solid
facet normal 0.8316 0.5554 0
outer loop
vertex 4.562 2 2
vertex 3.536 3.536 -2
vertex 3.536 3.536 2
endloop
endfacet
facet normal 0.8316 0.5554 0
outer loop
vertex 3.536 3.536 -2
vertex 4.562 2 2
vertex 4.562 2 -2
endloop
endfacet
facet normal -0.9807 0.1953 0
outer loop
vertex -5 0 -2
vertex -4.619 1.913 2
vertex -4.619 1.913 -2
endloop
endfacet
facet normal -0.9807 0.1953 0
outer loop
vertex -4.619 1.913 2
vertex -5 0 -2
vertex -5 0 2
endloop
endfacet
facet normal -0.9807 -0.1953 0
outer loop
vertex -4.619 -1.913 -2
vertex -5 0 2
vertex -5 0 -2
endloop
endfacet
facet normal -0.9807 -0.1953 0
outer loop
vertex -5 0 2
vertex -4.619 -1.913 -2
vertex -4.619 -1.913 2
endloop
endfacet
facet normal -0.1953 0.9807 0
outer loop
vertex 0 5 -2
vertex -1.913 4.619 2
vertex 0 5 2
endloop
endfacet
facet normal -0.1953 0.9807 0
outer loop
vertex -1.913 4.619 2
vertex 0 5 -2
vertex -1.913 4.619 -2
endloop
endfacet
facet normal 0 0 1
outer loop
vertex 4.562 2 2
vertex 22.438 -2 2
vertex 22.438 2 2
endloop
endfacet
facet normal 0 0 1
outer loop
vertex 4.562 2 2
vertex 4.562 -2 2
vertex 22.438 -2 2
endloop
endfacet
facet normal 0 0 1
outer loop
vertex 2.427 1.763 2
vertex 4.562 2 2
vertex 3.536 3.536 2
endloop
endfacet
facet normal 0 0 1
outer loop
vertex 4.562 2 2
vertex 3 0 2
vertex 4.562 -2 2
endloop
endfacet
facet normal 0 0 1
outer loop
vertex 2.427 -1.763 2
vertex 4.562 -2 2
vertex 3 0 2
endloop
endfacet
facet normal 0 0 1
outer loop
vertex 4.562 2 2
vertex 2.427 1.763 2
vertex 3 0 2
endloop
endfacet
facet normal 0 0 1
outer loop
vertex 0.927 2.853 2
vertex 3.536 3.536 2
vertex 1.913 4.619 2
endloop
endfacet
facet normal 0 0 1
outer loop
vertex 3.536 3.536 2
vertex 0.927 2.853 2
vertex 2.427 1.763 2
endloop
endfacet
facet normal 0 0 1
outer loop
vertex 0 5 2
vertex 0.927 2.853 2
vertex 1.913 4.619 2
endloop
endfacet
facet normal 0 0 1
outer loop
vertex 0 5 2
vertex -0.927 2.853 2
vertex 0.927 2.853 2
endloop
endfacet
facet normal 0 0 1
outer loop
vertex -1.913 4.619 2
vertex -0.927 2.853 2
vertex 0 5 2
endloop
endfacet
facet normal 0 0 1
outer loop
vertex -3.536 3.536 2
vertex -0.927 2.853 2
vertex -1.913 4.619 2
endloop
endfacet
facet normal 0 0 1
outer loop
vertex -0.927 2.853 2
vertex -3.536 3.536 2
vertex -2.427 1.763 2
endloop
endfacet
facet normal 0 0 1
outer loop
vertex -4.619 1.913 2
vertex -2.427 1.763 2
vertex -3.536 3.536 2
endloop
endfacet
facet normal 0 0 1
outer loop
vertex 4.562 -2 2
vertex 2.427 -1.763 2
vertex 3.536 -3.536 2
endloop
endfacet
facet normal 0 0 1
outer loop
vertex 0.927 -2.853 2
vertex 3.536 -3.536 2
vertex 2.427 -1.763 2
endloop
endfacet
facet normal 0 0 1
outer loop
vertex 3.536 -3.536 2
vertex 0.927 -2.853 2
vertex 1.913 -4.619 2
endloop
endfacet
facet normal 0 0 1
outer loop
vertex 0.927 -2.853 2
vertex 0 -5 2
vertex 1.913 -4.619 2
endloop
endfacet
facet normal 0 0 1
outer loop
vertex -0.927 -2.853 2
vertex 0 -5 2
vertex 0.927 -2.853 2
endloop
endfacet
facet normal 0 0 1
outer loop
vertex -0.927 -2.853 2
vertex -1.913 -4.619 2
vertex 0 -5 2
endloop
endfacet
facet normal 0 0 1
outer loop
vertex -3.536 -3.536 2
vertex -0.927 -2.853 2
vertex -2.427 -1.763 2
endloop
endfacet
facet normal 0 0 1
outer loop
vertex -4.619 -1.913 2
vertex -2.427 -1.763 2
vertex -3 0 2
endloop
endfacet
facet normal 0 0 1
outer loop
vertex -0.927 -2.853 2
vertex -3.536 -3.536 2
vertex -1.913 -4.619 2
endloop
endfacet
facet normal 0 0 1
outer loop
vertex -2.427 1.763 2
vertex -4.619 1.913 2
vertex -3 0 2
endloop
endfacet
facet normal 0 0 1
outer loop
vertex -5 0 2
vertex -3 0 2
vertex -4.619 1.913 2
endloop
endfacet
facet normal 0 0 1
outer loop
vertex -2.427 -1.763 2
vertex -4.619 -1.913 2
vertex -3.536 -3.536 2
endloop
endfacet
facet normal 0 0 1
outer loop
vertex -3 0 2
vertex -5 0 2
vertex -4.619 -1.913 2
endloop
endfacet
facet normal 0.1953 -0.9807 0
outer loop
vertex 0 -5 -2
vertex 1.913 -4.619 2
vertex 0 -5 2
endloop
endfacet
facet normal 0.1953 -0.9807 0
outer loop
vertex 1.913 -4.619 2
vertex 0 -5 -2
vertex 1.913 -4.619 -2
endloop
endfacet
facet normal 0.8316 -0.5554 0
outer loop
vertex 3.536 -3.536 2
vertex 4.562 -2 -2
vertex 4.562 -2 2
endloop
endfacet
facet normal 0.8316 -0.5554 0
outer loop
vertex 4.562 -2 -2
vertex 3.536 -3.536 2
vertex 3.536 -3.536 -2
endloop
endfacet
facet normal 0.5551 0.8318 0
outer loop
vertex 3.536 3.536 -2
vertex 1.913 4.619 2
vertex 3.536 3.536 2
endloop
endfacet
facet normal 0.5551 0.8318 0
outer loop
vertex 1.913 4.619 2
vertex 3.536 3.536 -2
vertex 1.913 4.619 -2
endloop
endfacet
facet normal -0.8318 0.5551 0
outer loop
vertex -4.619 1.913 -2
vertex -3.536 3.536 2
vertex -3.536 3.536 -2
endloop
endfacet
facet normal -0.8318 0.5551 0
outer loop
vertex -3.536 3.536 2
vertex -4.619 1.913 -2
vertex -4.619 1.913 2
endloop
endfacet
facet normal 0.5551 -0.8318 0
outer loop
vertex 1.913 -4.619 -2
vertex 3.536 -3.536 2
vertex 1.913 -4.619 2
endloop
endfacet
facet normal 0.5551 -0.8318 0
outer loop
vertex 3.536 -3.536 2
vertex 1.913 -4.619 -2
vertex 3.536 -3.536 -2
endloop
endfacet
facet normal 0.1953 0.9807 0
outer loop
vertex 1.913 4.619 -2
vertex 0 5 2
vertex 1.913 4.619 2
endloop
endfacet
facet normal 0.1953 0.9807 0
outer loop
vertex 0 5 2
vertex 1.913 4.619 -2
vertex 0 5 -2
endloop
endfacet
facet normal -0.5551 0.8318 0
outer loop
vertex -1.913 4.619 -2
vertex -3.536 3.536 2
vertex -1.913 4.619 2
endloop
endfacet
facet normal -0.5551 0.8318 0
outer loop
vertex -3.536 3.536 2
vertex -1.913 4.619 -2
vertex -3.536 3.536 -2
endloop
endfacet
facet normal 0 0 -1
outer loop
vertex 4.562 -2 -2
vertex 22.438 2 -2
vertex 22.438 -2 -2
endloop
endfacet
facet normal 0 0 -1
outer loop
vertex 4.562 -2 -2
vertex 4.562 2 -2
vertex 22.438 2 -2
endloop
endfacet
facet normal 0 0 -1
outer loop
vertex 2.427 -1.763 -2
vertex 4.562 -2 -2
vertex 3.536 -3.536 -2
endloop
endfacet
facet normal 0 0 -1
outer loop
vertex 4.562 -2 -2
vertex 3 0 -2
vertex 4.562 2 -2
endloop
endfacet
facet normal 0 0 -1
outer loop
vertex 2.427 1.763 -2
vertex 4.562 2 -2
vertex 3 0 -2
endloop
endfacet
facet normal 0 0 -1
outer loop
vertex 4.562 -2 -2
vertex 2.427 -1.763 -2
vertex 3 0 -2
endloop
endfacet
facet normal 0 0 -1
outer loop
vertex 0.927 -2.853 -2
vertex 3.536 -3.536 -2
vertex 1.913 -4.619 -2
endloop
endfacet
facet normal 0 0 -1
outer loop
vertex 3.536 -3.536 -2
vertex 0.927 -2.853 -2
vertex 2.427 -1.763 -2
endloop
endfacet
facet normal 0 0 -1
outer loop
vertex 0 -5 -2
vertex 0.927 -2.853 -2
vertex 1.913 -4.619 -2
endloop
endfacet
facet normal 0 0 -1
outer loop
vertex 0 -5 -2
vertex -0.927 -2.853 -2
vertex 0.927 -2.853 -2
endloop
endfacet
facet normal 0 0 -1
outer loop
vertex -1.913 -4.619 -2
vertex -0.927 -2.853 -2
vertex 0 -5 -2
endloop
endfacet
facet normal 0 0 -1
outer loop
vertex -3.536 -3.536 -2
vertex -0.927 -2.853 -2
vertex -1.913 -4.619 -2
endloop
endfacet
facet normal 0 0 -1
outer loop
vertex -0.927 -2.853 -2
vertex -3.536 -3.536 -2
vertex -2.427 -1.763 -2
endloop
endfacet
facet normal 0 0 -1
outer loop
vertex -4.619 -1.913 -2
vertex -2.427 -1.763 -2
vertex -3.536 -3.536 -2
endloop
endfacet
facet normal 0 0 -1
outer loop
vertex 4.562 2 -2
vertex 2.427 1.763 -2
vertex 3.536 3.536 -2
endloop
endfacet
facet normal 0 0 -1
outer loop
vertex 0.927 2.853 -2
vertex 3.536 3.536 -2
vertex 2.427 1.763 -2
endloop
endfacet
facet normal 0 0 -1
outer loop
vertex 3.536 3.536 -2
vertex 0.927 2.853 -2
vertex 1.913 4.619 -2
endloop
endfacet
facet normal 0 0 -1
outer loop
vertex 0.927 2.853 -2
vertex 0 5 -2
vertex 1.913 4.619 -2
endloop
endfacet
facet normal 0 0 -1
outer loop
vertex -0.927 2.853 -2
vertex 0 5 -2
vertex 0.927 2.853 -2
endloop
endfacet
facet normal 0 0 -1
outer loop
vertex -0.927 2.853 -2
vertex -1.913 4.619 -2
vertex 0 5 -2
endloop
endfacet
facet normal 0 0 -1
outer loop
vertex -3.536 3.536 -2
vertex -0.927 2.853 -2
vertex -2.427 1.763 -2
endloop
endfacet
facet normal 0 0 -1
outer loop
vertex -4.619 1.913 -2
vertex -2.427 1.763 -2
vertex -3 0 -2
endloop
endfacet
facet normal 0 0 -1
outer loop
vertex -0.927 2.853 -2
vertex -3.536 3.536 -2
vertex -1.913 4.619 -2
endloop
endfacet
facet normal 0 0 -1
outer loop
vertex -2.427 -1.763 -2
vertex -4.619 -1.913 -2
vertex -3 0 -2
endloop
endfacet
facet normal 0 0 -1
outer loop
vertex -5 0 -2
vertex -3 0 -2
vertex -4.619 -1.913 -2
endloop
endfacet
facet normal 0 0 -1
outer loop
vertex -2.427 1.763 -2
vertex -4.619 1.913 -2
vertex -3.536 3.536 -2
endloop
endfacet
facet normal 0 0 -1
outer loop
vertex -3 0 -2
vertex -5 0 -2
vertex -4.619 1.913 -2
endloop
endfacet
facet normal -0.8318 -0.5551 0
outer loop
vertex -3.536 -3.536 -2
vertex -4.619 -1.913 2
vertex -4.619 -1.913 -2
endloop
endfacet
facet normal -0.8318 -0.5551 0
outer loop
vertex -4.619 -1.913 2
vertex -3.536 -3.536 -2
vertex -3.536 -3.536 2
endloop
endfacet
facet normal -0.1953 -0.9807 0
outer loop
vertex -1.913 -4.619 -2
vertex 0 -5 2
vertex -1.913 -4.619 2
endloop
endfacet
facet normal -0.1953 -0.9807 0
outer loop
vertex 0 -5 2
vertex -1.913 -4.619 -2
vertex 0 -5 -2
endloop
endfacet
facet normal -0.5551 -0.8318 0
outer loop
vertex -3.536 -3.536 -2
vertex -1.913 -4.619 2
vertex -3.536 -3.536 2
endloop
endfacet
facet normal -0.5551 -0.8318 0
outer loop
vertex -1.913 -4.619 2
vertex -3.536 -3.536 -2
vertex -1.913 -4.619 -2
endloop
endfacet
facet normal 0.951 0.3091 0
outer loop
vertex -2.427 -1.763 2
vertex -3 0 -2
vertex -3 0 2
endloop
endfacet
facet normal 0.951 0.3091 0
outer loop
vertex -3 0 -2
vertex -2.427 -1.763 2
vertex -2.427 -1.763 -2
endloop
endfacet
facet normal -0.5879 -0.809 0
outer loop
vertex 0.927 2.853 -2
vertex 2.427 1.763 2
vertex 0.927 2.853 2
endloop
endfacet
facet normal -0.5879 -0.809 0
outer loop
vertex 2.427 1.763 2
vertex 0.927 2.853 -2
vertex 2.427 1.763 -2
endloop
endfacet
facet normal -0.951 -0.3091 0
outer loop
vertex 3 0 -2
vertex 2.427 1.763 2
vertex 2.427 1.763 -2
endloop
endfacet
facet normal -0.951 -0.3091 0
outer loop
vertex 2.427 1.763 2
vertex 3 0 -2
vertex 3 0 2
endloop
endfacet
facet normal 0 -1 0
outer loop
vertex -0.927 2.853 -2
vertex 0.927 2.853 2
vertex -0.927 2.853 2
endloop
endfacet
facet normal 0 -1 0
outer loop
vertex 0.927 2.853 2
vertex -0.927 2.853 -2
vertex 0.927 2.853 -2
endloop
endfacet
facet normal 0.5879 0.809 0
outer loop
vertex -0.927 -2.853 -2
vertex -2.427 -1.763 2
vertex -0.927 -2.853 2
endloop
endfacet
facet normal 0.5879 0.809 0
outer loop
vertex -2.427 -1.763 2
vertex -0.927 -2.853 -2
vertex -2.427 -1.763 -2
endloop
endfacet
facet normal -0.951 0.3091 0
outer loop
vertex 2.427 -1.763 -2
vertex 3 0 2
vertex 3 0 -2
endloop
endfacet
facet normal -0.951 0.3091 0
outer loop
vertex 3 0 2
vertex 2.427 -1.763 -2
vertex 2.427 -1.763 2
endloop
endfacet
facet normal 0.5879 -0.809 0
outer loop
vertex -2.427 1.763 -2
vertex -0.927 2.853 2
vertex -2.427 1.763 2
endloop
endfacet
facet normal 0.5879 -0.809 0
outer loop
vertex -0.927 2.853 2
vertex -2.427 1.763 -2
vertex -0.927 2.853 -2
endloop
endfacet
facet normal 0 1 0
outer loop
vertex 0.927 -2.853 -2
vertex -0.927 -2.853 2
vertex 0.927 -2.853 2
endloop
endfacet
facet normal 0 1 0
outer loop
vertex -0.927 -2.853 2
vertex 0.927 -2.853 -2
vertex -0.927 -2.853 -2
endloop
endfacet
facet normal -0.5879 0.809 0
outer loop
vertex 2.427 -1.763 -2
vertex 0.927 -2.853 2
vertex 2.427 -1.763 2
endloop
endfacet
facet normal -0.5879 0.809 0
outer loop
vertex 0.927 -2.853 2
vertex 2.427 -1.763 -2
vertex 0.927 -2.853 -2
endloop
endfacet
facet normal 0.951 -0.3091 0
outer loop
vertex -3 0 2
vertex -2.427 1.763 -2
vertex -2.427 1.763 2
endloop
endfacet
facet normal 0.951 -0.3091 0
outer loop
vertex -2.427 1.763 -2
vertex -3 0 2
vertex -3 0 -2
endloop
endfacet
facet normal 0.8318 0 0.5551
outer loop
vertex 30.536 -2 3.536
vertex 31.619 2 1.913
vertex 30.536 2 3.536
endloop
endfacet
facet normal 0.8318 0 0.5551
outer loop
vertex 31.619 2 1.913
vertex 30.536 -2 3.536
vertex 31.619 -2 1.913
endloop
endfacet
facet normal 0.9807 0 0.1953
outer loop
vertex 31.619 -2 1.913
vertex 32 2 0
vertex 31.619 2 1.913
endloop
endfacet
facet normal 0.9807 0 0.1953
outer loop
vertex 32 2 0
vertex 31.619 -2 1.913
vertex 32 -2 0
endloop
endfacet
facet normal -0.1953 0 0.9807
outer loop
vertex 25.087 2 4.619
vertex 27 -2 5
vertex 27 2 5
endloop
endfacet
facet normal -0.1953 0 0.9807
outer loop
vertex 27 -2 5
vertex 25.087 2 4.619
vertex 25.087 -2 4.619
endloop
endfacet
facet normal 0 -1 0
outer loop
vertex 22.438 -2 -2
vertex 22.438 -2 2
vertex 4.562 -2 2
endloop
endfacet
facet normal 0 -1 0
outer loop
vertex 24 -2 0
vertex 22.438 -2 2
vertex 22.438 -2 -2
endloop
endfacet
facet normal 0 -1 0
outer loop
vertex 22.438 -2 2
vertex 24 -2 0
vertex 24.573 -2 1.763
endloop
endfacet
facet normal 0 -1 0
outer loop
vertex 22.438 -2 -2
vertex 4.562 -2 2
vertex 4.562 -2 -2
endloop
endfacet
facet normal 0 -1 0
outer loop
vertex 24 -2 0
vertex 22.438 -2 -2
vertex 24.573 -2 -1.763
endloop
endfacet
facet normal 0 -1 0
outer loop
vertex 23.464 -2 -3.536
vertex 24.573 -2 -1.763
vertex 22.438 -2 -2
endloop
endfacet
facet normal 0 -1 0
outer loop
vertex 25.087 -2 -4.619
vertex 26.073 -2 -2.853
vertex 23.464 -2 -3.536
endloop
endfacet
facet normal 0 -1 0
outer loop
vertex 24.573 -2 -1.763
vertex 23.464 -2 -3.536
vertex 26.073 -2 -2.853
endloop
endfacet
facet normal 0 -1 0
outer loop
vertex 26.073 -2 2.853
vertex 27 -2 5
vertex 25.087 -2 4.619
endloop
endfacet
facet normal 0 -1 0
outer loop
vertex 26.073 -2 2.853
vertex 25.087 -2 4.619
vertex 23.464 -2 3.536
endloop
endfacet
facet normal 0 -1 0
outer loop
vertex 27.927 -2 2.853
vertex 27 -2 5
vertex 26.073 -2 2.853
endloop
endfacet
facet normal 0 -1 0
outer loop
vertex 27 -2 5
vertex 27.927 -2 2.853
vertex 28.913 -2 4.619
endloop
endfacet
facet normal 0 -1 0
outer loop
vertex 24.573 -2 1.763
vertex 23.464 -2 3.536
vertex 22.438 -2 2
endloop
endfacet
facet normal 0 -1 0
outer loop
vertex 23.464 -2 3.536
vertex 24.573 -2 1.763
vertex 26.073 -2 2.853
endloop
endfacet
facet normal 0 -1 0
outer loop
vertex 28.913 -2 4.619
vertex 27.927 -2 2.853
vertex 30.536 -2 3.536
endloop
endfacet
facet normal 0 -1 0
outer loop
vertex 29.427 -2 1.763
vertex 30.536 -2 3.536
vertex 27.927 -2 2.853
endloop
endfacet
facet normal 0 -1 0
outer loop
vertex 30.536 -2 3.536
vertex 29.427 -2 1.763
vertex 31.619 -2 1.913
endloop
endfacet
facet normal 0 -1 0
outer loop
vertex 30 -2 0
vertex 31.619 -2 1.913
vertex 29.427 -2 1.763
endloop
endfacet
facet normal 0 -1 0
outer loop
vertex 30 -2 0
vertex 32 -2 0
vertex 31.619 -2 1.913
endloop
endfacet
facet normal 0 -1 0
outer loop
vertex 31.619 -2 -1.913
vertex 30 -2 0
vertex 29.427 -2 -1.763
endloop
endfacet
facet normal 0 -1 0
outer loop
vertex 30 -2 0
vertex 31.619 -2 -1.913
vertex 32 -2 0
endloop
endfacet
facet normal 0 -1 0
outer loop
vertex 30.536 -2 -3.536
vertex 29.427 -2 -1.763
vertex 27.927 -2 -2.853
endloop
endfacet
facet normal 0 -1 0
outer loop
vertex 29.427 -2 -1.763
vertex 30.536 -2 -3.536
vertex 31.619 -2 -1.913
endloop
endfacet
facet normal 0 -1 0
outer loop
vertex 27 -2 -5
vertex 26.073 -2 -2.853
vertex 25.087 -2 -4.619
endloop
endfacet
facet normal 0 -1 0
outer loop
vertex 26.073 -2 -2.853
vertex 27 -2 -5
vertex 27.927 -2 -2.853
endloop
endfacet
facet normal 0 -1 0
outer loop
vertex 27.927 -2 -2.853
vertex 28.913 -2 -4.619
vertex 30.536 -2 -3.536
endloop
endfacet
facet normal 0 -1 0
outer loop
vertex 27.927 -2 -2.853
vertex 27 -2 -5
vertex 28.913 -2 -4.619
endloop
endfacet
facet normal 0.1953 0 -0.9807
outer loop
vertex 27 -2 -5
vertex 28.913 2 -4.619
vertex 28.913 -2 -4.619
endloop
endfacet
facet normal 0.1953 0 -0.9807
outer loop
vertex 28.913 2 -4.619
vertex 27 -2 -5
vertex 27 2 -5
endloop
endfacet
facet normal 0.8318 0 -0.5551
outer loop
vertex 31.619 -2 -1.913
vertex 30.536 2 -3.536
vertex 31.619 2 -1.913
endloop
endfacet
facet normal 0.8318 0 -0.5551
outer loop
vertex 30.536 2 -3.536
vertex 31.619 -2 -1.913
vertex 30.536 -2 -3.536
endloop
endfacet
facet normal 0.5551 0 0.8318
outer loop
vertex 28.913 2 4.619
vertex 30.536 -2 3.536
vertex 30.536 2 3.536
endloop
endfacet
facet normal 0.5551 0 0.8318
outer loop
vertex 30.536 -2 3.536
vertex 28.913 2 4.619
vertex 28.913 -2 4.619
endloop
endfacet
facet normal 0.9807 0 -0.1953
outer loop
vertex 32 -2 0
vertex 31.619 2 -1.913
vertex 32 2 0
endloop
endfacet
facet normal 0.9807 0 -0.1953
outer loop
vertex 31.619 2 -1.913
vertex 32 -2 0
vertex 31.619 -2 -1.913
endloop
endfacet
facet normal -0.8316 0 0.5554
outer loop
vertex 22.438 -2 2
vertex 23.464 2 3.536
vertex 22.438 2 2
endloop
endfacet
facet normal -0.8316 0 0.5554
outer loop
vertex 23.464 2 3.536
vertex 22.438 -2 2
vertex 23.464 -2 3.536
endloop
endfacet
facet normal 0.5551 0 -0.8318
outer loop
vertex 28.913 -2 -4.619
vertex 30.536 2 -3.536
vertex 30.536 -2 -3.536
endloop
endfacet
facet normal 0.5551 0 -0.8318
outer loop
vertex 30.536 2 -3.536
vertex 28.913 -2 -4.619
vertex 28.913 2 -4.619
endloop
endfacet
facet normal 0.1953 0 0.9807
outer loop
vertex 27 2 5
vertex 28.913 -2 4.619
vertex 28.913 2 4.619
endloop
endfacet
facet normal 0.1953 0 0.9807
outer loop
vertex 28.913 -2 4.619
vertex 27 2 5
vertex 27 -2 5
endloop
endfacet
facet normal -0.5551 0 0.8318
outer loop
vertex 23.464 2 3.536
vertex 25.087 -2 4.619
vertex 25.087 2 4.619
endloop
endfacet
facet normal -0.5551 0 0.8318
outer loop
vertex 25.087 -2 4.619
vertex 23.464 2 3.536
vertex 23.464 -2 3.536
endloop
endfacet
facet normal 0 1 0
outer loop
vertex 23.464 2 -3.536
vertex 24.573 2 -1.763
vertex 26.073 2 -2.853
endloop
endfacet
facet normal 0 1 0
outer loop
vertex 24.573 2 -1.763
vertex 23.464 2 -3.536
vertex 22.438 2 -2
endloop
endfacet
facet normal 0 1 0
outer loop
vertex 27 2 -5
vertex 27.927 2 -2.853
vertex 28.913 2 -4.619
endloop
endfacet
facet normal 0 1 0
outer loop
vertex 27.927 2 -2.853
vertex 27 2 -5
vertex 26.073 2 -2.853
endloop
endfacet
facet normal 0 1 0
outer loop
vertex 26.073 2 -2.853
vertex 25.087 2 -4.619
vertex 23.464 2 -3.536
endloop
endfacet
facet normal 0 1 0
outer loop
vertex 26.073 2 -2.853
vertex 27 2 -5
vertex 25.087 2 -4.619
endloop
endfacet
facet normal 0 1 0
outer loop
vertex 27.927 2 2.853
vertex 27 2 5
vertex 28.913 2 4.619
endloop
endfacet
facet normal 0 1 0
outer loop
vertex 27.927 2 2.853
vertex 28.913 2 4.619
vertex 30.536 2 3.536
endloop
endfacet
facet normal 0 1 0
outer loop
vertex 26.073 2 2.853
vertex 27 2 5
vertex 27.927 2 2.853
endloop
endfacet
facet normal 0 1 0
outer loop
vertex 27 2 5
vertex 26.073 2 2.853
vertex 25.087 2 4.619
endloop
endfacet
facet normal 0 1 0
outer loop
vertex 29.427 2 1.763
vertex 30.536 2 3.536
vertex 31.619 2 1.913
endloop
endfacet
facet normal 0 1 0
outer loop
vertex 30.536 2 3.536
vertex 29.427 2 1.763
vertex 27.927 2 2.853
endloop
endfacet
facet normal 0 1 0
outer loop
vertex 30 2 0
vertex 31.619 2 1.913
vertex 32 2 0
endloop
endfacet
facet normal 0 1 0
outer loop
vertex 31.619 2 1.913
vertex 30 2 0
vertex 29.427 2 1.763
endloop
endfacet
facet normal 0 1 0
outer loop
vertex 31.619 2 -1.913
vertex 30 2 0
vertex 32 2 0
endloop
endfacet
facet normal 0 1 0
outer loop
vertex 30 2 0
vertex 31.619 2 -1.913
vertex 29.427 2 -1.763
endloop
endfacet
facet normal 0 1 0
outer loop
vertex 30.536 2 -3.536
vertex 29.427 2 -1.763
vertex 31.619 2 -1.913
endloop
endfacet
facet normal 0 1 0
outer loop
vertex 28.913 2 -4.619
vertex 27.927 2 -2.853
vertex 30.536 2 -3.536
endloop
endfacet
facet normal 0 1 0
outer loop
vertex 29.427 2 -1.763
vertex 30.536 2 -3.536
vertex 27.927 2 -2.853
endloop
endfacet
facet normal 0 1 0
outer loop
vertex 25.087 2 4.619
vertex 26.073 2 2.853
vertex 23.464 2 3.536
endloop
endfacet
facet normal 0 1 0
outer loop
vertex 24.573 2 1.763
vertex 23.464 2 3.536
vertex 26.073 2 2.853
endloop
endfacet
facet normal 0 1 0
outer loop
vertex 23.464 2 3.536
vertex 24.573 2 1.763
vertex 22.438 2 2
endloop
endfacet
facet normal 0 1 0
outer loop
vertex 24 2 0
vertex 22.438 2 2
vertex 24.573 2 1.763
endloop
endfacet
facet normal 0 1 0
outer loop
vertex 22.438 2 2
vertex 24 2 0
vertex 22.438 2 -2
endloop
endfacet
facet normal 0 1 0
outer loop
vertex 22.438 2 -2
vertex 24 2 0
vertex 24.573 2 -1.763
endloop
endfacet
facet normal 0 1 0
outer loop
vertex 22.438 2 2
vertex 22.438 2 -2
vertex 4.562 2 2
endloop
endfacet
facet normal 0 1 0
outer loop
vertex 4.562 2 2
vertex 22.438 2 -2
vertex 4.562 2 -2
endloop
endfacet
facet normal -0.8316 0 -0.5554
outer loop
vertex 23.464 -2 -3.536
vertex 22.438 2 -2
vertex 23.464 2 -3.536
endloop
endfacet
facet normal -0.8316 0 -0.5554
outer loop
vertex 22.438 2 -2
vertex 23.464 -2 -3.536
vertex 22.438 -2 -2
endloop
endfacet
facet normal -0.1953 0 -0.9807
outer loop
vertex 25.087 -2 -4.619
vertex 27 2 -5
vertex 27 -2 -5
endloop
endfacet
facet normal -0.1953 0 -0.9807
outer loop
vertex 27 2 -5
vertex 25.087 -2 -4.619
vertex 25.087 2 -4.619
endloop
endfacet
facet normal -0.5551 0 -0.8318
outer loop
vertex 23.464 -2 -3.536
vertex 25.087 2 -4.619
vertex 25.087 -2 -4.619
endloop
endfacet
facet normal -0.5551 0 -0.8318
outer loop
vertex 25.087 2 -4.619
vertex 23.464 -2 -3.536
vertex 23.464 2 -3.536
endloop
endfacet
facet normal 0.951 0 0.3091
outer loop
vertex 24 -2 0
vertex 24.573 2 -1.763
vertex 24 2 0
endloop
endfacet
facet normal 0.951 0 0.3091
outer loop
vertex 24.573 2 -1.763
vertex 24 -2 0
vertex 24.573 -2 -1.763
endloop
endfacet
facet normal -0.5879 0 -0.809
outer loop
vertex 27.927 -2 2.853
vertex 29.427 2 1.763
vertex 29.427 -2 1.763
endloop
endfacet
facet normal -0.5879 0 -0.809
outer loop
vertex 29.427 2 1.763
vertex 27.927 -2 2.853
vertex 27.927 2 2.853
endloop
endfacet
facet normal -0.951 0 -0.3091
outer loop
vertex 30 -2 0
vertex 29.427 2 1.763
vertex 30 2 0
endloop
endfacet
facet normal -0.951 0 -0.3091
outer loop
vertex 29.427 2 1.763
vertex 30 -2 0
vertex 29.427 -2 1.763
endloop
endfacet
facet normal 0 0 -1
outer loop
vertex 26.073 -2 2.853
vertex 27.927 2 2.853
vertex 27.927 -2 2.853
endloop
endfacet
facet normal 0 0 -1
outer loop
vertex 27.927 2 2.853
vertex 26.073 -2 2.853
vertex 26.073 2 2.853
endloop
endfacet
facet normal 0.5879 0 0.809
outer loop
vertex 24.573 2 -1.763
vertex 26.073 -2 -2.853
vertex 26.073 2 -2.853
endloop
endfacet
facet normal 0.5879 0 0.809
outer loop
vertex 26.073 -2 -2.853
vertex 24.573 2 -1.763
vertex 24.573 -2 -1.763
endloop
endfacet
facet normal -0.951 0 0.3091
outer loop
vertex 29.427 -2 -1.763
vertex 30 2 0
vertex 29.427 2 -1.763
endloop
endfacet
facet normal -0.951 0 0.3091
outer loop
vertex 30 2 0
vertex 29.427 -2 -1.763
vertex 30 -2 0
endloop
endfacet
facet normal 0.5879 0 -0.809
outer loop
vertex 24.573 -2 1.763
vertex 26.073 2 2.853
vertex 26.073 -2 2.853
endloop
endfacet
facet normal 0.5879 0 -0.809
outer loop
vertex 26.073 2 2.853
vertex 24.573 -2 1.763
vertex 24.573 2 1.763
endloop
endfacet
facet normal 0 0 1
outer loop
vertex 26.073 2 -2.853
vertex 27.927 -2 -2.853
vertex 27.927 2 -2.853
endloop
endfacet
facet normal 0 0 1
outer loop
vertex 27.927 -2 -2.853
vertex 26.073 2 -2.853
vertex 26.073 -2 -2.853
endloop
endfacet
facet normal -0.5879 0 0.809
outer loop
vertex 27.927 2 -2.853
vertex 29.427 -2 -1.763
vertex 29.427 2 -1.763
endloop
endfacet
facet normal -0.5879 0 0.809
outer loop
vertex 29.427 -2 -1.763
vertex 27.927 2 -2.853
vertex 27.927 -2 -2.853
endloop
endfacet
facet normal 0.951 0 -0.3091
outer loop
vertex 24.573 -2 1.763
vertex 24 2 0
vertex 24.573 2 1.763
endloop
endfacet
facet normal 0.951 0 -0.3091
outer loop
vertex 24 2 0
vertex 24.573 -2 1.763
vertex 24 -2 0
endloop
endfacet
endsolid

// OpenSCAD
translate([0,0,0]) {
//    cube([4.5,4.5,38], center=true);
//     cylinder(10);
//    circle(r = 10);
}

translate([0,0,-2]) {
  union() {
    difference() {
      cylinder( d = 10, h = 4);
      cylinder( d = 6, h = 4);
    }
  }
}
translate([14,0,0]) {
    cube([20,4,4], center=true);
}

rotate([90,0,0]) {
  translate([27,0,-2]) {
    union() {
      difference() {
        cylinder( d = 10, h = 4);
        cylinder( d = 6, h = 4);
      }
    }
  }
}
